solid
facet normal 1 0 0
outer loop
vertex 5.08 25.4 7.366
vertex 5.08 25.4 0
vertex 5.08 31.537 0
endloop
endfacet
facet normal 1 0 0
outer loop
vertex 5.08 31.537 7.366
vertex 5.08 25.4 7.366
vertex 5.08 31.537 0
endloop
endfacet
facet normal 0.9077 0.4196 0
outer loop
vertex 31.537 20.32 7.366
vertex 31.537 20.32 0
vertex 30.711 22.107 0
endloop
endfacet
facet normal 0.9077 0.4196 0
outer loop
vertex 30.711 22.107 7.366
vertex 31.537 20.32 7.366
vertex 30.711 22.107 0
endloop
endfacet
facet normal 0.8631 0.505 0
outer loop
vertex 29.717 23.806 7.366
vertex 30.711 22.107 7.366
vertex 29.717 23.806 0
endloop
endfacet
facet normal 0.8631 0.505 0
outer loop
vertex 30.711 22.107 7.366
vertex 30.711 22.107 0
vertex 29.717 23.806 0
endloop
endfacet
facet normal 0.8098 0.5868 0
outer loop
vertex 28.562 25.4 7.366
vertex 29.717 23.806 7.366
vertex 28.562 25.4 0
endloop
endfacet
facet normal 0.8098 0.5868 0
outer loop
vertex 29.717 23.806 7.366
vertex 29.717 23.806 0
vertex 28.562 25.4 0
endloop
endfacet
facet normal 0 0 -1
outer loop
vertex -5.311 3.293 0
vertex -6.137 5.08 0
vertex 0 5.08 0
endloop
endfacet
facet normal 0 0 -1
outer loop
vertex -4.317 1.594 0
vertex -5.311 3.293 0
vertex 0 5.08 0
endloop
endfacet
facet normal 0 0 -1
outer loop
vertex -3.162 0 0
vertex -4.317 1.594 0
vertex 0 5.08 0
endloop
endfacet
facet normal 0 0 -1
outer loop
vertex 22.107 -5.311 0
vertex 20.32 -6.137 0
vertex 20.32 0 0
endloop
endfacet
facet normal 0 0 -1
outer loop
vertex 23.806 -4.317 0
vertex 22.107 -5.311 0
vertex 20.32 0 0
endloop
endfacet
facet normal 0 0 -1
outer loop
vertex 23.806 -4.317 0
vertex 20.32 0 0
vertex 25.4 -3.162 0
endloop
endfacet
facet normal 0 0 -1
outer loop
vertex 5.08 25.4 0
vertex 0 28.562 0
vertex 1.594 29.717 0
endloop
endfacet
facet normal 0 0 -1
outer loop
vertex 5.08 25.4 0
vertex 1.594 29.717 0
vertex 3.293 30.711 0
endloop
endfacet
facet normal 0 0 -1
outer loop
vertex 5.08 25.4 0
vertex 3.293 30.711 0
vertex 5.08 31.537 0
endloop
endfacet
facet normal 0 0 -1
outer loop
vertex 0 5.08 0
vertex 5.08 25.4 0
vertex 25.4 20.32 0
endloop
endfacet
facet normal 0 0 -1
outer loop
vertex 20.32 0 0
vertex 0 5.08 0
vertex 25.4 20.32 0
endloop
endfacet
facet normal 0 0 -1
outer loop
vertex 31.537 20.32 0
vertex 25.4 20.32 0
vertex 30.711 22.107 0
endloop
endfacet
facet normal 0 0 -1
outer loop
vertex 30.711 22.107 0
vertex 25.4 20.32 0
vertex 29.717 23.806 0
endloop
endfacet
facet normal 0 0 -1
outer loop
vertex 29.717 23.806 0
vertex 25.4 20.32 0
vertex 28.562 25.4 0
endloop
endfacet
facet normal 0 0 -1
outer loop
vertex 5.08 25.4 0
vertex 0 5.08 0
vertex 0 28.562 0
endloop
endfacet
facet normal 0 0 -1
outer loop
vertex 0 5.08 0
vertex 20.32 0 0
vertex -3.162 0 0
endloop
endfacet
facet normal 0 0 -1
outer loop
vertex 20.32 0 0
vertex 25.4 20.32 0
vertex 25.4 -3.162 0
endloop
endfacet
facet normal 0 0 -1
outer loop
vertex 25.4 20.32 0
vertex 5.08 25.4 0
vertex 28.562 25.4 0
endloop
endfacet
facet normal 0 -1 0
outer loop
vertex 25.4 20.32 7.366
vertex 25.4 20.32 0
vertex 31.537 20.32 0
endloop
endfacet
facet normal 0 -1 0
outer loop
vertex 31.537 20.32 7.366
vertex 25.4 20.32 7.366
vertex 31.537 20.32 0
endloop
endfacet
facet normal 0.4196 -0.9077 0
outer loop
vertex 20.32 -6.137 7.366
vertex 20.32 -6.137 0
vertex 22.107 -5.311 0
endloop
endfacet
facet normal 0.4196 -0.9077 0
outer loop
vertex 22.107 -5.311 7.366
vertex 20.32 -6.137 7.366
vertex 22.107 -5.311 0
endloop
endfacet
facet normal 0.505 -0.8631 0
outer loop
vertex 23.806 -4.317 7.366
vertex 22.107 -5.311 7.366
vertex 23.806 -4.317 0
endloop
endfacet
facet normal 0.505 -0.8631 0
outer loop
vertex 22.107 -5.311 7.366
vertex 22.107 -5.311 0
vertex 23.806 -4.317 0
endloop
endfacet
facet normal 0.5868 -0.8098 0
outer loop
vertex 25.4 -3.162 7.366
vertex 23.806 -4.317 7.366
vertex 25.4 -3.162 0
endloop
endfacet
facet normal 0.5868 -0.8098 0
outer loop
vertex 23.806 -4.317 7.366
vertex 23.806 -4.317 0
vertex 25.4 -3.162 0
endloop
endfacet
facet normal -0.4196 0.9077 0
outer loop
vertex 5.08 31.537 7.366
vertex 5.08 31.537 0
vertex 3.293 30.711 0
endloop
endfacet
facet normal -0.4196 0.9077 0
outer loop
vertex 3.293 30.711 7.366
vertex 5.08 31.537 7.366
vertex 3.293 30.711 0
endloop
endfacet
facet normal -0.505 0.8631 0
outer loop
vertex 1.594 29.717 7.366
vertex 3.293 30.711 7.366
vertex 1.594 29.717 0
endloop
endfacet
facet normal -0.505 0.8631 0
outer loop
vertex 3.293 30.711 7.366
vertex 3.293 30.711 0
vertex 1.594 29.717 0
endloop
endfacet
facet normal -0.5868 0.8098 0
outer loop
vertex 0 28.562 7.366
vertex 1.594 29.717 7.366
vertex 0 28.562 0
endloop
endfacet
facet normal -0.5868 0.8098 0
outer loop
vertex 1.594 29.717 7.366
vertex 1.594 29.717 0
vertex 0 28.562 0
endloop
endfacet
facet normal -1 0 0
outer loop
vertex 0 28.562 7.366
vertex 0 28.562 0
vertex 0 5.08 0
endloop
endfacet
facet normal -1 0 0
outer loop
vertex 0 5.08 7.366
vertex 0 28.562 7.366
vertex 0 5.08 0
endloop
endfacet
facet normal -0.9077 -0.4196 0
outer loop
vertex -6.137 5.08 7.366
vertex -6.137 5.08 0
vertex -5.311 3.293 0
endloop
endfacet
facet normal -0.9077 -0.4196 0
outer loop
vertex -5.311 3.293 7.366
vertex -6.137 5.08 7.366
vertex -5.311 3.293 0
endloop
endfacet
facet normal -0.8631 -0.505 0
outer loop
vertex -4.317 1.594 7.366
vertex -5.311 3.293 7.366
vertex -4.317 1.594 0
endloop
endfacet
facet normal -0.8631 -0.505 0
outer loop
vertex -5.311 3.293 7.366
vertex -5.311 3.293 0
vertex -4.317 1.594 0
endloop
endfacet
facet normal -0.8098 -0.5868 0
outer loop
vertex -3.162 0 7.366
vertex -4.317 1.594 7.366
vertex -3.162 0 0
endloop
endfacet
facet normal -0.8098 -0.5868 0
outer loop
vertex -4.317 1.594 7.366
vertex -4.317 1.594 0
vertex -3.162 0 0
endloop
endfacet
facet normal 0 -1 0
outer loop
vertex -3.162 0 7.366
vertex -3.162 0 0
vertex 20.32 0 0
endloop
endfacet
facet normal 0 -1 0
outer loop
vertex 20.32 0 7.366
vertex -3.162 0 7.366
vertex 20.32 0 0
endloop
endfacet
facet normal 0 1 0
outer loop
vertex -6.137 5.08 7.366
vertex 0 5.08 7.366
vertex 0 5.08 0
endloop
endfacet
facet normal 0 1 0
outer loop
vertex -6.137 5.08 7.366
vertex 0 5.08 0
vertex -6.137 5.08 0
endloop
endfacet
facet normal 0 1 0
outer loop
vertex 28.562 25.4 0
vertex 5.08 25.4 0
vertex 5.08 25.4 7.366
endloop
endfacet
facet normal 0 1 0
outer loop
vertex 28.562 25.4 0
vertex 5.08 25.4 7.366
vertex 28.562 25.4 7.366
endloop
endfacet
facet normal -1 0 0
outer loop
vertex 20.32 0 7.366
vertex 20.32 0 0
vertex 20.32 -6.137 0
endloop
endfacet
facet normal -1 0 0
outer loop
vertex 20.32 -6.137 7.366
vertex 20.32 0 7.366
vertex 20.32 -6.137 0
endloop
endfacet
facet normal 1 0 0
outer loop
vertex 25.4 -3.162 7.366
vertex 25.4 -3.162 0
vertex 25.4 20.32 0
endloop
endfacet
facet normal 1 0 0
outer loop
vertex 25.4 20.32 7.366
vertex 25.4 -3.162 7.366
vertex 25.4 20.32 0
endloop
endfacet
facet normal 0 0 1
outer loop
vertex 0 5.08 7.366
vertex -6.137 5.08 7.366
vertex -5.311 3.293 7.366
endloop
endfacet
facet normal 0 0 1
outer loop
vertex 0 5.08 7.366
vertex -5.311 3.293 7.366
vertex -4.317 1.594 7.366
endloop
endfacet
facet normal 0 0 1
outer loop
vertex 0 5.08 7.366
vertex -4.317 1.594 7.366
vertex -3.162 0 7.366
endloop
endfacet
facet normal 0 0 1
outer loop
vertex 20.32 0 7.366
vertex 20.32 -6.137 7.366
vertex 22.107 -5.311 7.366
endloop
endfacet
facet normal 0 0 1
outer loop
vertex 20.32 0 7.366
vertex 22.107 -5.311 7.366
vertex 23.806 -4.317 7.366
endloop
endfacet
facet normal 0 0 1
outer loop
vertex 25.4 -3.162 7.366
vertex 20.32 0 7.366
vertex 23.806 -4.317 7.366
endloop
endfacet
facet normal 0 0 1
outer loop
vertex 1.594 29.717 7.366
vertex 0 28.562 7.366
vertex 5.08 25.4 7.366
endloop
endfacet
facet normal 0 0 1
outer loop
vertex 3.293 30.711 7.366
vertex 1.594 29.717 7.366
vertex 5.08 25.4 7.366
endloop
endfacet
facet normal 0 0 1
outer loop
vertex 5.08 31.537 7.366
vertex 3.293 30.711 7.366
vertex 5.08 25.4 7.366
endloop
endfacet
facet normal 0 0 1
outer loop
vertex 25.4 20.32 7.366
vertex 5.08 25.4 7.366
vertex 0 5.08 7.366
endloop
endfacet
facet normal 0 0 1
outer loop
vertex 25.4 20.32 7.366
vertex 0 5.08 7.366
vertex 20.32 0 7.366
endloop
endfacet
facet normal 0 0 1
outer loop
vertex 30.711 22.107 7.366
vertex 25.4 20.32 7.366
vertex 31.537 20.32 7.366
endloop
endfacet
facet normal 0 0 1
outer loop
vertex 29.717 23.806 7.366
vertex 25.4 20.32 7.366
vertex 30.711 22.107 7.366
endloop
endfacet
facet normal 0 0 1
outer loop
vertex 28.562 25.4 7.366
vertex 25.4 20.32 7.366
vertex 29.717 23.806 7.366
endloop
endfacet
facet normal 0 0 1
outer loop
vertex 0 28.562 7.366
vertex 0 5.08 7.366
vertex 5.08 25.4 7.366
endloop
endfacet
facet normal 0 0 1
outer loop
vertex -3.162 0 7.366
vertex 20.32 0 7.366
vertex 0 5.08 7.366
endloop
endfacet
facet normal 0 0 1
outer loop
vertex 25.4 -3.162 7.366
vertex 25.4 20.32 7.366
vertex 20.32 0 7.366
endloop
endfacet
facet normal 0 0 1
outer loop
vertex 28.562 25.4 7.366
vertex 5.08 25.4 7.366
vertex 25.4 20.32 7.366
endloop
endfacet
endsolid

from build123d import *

# Parameters (mm, degrees)
F0_W     = 25.4
F0_H     = 25.4
F1_DEPTH = 7.366
F3_DEPTH = 7.366


with BuildPart() as f1:
    # F0 (on Top) → F1 (new body)
    with BuildSketch(Plane.XY):
        with Locations((12.7, 12.7)):
            Rectangle(F0_W, F0_H)
    extrude(amount=F1_DEPTH)

    # F2 (on Top) → F3 (join)
    with BuildSketch(Plane.XY):
        with BuildLine():
            Line((5.08, 25.4), (5.08, 31.537144))
            ThreePointArc((5.08, 31.537144), (2.431698, 30.234662), (0, 28.562295))
            Line((0, 28.562295), (0, 25.4))
            Line((0, 25.4), (5.08, 25.4))
        make_face()
        with BuildLine():
            Line((28.562295, 25.4), (25.4, 25.4))
            Line((25.4, 25.4), (25.4, 20.32))
            Line((25.4, 20.32), (31.537144, 20.32))
            ThreePointArc((31.537144, 20.32), (30.234662, 22.968302), (28.562295, 25.4))
        make_face()
        with BuildLine():
            Line((25.4, -3.162295), (25.4, 0))
            Line((25.4, 0), (20.32, 0))
            Line((20.32, 0), (20.32, -6.137144))
            ThreePointArc((20.32, -6.137144), (22.968302, -4.834662), (25.4, -3.162295))
        make_face()
        with BuildLine():
            Line((-3.162295, 0), (0, 0))
            Line((0, 0), (0, 5.08))
            Line((0, 5.08), (-6.137144, 5.08))
            ThreePointArc((-6.137144, 5.08), (-4.834662, 2.431698), (-3.162295, 0))
        make_face()
    extrude(amount=F3_DEPTH)


solid = f1.part
